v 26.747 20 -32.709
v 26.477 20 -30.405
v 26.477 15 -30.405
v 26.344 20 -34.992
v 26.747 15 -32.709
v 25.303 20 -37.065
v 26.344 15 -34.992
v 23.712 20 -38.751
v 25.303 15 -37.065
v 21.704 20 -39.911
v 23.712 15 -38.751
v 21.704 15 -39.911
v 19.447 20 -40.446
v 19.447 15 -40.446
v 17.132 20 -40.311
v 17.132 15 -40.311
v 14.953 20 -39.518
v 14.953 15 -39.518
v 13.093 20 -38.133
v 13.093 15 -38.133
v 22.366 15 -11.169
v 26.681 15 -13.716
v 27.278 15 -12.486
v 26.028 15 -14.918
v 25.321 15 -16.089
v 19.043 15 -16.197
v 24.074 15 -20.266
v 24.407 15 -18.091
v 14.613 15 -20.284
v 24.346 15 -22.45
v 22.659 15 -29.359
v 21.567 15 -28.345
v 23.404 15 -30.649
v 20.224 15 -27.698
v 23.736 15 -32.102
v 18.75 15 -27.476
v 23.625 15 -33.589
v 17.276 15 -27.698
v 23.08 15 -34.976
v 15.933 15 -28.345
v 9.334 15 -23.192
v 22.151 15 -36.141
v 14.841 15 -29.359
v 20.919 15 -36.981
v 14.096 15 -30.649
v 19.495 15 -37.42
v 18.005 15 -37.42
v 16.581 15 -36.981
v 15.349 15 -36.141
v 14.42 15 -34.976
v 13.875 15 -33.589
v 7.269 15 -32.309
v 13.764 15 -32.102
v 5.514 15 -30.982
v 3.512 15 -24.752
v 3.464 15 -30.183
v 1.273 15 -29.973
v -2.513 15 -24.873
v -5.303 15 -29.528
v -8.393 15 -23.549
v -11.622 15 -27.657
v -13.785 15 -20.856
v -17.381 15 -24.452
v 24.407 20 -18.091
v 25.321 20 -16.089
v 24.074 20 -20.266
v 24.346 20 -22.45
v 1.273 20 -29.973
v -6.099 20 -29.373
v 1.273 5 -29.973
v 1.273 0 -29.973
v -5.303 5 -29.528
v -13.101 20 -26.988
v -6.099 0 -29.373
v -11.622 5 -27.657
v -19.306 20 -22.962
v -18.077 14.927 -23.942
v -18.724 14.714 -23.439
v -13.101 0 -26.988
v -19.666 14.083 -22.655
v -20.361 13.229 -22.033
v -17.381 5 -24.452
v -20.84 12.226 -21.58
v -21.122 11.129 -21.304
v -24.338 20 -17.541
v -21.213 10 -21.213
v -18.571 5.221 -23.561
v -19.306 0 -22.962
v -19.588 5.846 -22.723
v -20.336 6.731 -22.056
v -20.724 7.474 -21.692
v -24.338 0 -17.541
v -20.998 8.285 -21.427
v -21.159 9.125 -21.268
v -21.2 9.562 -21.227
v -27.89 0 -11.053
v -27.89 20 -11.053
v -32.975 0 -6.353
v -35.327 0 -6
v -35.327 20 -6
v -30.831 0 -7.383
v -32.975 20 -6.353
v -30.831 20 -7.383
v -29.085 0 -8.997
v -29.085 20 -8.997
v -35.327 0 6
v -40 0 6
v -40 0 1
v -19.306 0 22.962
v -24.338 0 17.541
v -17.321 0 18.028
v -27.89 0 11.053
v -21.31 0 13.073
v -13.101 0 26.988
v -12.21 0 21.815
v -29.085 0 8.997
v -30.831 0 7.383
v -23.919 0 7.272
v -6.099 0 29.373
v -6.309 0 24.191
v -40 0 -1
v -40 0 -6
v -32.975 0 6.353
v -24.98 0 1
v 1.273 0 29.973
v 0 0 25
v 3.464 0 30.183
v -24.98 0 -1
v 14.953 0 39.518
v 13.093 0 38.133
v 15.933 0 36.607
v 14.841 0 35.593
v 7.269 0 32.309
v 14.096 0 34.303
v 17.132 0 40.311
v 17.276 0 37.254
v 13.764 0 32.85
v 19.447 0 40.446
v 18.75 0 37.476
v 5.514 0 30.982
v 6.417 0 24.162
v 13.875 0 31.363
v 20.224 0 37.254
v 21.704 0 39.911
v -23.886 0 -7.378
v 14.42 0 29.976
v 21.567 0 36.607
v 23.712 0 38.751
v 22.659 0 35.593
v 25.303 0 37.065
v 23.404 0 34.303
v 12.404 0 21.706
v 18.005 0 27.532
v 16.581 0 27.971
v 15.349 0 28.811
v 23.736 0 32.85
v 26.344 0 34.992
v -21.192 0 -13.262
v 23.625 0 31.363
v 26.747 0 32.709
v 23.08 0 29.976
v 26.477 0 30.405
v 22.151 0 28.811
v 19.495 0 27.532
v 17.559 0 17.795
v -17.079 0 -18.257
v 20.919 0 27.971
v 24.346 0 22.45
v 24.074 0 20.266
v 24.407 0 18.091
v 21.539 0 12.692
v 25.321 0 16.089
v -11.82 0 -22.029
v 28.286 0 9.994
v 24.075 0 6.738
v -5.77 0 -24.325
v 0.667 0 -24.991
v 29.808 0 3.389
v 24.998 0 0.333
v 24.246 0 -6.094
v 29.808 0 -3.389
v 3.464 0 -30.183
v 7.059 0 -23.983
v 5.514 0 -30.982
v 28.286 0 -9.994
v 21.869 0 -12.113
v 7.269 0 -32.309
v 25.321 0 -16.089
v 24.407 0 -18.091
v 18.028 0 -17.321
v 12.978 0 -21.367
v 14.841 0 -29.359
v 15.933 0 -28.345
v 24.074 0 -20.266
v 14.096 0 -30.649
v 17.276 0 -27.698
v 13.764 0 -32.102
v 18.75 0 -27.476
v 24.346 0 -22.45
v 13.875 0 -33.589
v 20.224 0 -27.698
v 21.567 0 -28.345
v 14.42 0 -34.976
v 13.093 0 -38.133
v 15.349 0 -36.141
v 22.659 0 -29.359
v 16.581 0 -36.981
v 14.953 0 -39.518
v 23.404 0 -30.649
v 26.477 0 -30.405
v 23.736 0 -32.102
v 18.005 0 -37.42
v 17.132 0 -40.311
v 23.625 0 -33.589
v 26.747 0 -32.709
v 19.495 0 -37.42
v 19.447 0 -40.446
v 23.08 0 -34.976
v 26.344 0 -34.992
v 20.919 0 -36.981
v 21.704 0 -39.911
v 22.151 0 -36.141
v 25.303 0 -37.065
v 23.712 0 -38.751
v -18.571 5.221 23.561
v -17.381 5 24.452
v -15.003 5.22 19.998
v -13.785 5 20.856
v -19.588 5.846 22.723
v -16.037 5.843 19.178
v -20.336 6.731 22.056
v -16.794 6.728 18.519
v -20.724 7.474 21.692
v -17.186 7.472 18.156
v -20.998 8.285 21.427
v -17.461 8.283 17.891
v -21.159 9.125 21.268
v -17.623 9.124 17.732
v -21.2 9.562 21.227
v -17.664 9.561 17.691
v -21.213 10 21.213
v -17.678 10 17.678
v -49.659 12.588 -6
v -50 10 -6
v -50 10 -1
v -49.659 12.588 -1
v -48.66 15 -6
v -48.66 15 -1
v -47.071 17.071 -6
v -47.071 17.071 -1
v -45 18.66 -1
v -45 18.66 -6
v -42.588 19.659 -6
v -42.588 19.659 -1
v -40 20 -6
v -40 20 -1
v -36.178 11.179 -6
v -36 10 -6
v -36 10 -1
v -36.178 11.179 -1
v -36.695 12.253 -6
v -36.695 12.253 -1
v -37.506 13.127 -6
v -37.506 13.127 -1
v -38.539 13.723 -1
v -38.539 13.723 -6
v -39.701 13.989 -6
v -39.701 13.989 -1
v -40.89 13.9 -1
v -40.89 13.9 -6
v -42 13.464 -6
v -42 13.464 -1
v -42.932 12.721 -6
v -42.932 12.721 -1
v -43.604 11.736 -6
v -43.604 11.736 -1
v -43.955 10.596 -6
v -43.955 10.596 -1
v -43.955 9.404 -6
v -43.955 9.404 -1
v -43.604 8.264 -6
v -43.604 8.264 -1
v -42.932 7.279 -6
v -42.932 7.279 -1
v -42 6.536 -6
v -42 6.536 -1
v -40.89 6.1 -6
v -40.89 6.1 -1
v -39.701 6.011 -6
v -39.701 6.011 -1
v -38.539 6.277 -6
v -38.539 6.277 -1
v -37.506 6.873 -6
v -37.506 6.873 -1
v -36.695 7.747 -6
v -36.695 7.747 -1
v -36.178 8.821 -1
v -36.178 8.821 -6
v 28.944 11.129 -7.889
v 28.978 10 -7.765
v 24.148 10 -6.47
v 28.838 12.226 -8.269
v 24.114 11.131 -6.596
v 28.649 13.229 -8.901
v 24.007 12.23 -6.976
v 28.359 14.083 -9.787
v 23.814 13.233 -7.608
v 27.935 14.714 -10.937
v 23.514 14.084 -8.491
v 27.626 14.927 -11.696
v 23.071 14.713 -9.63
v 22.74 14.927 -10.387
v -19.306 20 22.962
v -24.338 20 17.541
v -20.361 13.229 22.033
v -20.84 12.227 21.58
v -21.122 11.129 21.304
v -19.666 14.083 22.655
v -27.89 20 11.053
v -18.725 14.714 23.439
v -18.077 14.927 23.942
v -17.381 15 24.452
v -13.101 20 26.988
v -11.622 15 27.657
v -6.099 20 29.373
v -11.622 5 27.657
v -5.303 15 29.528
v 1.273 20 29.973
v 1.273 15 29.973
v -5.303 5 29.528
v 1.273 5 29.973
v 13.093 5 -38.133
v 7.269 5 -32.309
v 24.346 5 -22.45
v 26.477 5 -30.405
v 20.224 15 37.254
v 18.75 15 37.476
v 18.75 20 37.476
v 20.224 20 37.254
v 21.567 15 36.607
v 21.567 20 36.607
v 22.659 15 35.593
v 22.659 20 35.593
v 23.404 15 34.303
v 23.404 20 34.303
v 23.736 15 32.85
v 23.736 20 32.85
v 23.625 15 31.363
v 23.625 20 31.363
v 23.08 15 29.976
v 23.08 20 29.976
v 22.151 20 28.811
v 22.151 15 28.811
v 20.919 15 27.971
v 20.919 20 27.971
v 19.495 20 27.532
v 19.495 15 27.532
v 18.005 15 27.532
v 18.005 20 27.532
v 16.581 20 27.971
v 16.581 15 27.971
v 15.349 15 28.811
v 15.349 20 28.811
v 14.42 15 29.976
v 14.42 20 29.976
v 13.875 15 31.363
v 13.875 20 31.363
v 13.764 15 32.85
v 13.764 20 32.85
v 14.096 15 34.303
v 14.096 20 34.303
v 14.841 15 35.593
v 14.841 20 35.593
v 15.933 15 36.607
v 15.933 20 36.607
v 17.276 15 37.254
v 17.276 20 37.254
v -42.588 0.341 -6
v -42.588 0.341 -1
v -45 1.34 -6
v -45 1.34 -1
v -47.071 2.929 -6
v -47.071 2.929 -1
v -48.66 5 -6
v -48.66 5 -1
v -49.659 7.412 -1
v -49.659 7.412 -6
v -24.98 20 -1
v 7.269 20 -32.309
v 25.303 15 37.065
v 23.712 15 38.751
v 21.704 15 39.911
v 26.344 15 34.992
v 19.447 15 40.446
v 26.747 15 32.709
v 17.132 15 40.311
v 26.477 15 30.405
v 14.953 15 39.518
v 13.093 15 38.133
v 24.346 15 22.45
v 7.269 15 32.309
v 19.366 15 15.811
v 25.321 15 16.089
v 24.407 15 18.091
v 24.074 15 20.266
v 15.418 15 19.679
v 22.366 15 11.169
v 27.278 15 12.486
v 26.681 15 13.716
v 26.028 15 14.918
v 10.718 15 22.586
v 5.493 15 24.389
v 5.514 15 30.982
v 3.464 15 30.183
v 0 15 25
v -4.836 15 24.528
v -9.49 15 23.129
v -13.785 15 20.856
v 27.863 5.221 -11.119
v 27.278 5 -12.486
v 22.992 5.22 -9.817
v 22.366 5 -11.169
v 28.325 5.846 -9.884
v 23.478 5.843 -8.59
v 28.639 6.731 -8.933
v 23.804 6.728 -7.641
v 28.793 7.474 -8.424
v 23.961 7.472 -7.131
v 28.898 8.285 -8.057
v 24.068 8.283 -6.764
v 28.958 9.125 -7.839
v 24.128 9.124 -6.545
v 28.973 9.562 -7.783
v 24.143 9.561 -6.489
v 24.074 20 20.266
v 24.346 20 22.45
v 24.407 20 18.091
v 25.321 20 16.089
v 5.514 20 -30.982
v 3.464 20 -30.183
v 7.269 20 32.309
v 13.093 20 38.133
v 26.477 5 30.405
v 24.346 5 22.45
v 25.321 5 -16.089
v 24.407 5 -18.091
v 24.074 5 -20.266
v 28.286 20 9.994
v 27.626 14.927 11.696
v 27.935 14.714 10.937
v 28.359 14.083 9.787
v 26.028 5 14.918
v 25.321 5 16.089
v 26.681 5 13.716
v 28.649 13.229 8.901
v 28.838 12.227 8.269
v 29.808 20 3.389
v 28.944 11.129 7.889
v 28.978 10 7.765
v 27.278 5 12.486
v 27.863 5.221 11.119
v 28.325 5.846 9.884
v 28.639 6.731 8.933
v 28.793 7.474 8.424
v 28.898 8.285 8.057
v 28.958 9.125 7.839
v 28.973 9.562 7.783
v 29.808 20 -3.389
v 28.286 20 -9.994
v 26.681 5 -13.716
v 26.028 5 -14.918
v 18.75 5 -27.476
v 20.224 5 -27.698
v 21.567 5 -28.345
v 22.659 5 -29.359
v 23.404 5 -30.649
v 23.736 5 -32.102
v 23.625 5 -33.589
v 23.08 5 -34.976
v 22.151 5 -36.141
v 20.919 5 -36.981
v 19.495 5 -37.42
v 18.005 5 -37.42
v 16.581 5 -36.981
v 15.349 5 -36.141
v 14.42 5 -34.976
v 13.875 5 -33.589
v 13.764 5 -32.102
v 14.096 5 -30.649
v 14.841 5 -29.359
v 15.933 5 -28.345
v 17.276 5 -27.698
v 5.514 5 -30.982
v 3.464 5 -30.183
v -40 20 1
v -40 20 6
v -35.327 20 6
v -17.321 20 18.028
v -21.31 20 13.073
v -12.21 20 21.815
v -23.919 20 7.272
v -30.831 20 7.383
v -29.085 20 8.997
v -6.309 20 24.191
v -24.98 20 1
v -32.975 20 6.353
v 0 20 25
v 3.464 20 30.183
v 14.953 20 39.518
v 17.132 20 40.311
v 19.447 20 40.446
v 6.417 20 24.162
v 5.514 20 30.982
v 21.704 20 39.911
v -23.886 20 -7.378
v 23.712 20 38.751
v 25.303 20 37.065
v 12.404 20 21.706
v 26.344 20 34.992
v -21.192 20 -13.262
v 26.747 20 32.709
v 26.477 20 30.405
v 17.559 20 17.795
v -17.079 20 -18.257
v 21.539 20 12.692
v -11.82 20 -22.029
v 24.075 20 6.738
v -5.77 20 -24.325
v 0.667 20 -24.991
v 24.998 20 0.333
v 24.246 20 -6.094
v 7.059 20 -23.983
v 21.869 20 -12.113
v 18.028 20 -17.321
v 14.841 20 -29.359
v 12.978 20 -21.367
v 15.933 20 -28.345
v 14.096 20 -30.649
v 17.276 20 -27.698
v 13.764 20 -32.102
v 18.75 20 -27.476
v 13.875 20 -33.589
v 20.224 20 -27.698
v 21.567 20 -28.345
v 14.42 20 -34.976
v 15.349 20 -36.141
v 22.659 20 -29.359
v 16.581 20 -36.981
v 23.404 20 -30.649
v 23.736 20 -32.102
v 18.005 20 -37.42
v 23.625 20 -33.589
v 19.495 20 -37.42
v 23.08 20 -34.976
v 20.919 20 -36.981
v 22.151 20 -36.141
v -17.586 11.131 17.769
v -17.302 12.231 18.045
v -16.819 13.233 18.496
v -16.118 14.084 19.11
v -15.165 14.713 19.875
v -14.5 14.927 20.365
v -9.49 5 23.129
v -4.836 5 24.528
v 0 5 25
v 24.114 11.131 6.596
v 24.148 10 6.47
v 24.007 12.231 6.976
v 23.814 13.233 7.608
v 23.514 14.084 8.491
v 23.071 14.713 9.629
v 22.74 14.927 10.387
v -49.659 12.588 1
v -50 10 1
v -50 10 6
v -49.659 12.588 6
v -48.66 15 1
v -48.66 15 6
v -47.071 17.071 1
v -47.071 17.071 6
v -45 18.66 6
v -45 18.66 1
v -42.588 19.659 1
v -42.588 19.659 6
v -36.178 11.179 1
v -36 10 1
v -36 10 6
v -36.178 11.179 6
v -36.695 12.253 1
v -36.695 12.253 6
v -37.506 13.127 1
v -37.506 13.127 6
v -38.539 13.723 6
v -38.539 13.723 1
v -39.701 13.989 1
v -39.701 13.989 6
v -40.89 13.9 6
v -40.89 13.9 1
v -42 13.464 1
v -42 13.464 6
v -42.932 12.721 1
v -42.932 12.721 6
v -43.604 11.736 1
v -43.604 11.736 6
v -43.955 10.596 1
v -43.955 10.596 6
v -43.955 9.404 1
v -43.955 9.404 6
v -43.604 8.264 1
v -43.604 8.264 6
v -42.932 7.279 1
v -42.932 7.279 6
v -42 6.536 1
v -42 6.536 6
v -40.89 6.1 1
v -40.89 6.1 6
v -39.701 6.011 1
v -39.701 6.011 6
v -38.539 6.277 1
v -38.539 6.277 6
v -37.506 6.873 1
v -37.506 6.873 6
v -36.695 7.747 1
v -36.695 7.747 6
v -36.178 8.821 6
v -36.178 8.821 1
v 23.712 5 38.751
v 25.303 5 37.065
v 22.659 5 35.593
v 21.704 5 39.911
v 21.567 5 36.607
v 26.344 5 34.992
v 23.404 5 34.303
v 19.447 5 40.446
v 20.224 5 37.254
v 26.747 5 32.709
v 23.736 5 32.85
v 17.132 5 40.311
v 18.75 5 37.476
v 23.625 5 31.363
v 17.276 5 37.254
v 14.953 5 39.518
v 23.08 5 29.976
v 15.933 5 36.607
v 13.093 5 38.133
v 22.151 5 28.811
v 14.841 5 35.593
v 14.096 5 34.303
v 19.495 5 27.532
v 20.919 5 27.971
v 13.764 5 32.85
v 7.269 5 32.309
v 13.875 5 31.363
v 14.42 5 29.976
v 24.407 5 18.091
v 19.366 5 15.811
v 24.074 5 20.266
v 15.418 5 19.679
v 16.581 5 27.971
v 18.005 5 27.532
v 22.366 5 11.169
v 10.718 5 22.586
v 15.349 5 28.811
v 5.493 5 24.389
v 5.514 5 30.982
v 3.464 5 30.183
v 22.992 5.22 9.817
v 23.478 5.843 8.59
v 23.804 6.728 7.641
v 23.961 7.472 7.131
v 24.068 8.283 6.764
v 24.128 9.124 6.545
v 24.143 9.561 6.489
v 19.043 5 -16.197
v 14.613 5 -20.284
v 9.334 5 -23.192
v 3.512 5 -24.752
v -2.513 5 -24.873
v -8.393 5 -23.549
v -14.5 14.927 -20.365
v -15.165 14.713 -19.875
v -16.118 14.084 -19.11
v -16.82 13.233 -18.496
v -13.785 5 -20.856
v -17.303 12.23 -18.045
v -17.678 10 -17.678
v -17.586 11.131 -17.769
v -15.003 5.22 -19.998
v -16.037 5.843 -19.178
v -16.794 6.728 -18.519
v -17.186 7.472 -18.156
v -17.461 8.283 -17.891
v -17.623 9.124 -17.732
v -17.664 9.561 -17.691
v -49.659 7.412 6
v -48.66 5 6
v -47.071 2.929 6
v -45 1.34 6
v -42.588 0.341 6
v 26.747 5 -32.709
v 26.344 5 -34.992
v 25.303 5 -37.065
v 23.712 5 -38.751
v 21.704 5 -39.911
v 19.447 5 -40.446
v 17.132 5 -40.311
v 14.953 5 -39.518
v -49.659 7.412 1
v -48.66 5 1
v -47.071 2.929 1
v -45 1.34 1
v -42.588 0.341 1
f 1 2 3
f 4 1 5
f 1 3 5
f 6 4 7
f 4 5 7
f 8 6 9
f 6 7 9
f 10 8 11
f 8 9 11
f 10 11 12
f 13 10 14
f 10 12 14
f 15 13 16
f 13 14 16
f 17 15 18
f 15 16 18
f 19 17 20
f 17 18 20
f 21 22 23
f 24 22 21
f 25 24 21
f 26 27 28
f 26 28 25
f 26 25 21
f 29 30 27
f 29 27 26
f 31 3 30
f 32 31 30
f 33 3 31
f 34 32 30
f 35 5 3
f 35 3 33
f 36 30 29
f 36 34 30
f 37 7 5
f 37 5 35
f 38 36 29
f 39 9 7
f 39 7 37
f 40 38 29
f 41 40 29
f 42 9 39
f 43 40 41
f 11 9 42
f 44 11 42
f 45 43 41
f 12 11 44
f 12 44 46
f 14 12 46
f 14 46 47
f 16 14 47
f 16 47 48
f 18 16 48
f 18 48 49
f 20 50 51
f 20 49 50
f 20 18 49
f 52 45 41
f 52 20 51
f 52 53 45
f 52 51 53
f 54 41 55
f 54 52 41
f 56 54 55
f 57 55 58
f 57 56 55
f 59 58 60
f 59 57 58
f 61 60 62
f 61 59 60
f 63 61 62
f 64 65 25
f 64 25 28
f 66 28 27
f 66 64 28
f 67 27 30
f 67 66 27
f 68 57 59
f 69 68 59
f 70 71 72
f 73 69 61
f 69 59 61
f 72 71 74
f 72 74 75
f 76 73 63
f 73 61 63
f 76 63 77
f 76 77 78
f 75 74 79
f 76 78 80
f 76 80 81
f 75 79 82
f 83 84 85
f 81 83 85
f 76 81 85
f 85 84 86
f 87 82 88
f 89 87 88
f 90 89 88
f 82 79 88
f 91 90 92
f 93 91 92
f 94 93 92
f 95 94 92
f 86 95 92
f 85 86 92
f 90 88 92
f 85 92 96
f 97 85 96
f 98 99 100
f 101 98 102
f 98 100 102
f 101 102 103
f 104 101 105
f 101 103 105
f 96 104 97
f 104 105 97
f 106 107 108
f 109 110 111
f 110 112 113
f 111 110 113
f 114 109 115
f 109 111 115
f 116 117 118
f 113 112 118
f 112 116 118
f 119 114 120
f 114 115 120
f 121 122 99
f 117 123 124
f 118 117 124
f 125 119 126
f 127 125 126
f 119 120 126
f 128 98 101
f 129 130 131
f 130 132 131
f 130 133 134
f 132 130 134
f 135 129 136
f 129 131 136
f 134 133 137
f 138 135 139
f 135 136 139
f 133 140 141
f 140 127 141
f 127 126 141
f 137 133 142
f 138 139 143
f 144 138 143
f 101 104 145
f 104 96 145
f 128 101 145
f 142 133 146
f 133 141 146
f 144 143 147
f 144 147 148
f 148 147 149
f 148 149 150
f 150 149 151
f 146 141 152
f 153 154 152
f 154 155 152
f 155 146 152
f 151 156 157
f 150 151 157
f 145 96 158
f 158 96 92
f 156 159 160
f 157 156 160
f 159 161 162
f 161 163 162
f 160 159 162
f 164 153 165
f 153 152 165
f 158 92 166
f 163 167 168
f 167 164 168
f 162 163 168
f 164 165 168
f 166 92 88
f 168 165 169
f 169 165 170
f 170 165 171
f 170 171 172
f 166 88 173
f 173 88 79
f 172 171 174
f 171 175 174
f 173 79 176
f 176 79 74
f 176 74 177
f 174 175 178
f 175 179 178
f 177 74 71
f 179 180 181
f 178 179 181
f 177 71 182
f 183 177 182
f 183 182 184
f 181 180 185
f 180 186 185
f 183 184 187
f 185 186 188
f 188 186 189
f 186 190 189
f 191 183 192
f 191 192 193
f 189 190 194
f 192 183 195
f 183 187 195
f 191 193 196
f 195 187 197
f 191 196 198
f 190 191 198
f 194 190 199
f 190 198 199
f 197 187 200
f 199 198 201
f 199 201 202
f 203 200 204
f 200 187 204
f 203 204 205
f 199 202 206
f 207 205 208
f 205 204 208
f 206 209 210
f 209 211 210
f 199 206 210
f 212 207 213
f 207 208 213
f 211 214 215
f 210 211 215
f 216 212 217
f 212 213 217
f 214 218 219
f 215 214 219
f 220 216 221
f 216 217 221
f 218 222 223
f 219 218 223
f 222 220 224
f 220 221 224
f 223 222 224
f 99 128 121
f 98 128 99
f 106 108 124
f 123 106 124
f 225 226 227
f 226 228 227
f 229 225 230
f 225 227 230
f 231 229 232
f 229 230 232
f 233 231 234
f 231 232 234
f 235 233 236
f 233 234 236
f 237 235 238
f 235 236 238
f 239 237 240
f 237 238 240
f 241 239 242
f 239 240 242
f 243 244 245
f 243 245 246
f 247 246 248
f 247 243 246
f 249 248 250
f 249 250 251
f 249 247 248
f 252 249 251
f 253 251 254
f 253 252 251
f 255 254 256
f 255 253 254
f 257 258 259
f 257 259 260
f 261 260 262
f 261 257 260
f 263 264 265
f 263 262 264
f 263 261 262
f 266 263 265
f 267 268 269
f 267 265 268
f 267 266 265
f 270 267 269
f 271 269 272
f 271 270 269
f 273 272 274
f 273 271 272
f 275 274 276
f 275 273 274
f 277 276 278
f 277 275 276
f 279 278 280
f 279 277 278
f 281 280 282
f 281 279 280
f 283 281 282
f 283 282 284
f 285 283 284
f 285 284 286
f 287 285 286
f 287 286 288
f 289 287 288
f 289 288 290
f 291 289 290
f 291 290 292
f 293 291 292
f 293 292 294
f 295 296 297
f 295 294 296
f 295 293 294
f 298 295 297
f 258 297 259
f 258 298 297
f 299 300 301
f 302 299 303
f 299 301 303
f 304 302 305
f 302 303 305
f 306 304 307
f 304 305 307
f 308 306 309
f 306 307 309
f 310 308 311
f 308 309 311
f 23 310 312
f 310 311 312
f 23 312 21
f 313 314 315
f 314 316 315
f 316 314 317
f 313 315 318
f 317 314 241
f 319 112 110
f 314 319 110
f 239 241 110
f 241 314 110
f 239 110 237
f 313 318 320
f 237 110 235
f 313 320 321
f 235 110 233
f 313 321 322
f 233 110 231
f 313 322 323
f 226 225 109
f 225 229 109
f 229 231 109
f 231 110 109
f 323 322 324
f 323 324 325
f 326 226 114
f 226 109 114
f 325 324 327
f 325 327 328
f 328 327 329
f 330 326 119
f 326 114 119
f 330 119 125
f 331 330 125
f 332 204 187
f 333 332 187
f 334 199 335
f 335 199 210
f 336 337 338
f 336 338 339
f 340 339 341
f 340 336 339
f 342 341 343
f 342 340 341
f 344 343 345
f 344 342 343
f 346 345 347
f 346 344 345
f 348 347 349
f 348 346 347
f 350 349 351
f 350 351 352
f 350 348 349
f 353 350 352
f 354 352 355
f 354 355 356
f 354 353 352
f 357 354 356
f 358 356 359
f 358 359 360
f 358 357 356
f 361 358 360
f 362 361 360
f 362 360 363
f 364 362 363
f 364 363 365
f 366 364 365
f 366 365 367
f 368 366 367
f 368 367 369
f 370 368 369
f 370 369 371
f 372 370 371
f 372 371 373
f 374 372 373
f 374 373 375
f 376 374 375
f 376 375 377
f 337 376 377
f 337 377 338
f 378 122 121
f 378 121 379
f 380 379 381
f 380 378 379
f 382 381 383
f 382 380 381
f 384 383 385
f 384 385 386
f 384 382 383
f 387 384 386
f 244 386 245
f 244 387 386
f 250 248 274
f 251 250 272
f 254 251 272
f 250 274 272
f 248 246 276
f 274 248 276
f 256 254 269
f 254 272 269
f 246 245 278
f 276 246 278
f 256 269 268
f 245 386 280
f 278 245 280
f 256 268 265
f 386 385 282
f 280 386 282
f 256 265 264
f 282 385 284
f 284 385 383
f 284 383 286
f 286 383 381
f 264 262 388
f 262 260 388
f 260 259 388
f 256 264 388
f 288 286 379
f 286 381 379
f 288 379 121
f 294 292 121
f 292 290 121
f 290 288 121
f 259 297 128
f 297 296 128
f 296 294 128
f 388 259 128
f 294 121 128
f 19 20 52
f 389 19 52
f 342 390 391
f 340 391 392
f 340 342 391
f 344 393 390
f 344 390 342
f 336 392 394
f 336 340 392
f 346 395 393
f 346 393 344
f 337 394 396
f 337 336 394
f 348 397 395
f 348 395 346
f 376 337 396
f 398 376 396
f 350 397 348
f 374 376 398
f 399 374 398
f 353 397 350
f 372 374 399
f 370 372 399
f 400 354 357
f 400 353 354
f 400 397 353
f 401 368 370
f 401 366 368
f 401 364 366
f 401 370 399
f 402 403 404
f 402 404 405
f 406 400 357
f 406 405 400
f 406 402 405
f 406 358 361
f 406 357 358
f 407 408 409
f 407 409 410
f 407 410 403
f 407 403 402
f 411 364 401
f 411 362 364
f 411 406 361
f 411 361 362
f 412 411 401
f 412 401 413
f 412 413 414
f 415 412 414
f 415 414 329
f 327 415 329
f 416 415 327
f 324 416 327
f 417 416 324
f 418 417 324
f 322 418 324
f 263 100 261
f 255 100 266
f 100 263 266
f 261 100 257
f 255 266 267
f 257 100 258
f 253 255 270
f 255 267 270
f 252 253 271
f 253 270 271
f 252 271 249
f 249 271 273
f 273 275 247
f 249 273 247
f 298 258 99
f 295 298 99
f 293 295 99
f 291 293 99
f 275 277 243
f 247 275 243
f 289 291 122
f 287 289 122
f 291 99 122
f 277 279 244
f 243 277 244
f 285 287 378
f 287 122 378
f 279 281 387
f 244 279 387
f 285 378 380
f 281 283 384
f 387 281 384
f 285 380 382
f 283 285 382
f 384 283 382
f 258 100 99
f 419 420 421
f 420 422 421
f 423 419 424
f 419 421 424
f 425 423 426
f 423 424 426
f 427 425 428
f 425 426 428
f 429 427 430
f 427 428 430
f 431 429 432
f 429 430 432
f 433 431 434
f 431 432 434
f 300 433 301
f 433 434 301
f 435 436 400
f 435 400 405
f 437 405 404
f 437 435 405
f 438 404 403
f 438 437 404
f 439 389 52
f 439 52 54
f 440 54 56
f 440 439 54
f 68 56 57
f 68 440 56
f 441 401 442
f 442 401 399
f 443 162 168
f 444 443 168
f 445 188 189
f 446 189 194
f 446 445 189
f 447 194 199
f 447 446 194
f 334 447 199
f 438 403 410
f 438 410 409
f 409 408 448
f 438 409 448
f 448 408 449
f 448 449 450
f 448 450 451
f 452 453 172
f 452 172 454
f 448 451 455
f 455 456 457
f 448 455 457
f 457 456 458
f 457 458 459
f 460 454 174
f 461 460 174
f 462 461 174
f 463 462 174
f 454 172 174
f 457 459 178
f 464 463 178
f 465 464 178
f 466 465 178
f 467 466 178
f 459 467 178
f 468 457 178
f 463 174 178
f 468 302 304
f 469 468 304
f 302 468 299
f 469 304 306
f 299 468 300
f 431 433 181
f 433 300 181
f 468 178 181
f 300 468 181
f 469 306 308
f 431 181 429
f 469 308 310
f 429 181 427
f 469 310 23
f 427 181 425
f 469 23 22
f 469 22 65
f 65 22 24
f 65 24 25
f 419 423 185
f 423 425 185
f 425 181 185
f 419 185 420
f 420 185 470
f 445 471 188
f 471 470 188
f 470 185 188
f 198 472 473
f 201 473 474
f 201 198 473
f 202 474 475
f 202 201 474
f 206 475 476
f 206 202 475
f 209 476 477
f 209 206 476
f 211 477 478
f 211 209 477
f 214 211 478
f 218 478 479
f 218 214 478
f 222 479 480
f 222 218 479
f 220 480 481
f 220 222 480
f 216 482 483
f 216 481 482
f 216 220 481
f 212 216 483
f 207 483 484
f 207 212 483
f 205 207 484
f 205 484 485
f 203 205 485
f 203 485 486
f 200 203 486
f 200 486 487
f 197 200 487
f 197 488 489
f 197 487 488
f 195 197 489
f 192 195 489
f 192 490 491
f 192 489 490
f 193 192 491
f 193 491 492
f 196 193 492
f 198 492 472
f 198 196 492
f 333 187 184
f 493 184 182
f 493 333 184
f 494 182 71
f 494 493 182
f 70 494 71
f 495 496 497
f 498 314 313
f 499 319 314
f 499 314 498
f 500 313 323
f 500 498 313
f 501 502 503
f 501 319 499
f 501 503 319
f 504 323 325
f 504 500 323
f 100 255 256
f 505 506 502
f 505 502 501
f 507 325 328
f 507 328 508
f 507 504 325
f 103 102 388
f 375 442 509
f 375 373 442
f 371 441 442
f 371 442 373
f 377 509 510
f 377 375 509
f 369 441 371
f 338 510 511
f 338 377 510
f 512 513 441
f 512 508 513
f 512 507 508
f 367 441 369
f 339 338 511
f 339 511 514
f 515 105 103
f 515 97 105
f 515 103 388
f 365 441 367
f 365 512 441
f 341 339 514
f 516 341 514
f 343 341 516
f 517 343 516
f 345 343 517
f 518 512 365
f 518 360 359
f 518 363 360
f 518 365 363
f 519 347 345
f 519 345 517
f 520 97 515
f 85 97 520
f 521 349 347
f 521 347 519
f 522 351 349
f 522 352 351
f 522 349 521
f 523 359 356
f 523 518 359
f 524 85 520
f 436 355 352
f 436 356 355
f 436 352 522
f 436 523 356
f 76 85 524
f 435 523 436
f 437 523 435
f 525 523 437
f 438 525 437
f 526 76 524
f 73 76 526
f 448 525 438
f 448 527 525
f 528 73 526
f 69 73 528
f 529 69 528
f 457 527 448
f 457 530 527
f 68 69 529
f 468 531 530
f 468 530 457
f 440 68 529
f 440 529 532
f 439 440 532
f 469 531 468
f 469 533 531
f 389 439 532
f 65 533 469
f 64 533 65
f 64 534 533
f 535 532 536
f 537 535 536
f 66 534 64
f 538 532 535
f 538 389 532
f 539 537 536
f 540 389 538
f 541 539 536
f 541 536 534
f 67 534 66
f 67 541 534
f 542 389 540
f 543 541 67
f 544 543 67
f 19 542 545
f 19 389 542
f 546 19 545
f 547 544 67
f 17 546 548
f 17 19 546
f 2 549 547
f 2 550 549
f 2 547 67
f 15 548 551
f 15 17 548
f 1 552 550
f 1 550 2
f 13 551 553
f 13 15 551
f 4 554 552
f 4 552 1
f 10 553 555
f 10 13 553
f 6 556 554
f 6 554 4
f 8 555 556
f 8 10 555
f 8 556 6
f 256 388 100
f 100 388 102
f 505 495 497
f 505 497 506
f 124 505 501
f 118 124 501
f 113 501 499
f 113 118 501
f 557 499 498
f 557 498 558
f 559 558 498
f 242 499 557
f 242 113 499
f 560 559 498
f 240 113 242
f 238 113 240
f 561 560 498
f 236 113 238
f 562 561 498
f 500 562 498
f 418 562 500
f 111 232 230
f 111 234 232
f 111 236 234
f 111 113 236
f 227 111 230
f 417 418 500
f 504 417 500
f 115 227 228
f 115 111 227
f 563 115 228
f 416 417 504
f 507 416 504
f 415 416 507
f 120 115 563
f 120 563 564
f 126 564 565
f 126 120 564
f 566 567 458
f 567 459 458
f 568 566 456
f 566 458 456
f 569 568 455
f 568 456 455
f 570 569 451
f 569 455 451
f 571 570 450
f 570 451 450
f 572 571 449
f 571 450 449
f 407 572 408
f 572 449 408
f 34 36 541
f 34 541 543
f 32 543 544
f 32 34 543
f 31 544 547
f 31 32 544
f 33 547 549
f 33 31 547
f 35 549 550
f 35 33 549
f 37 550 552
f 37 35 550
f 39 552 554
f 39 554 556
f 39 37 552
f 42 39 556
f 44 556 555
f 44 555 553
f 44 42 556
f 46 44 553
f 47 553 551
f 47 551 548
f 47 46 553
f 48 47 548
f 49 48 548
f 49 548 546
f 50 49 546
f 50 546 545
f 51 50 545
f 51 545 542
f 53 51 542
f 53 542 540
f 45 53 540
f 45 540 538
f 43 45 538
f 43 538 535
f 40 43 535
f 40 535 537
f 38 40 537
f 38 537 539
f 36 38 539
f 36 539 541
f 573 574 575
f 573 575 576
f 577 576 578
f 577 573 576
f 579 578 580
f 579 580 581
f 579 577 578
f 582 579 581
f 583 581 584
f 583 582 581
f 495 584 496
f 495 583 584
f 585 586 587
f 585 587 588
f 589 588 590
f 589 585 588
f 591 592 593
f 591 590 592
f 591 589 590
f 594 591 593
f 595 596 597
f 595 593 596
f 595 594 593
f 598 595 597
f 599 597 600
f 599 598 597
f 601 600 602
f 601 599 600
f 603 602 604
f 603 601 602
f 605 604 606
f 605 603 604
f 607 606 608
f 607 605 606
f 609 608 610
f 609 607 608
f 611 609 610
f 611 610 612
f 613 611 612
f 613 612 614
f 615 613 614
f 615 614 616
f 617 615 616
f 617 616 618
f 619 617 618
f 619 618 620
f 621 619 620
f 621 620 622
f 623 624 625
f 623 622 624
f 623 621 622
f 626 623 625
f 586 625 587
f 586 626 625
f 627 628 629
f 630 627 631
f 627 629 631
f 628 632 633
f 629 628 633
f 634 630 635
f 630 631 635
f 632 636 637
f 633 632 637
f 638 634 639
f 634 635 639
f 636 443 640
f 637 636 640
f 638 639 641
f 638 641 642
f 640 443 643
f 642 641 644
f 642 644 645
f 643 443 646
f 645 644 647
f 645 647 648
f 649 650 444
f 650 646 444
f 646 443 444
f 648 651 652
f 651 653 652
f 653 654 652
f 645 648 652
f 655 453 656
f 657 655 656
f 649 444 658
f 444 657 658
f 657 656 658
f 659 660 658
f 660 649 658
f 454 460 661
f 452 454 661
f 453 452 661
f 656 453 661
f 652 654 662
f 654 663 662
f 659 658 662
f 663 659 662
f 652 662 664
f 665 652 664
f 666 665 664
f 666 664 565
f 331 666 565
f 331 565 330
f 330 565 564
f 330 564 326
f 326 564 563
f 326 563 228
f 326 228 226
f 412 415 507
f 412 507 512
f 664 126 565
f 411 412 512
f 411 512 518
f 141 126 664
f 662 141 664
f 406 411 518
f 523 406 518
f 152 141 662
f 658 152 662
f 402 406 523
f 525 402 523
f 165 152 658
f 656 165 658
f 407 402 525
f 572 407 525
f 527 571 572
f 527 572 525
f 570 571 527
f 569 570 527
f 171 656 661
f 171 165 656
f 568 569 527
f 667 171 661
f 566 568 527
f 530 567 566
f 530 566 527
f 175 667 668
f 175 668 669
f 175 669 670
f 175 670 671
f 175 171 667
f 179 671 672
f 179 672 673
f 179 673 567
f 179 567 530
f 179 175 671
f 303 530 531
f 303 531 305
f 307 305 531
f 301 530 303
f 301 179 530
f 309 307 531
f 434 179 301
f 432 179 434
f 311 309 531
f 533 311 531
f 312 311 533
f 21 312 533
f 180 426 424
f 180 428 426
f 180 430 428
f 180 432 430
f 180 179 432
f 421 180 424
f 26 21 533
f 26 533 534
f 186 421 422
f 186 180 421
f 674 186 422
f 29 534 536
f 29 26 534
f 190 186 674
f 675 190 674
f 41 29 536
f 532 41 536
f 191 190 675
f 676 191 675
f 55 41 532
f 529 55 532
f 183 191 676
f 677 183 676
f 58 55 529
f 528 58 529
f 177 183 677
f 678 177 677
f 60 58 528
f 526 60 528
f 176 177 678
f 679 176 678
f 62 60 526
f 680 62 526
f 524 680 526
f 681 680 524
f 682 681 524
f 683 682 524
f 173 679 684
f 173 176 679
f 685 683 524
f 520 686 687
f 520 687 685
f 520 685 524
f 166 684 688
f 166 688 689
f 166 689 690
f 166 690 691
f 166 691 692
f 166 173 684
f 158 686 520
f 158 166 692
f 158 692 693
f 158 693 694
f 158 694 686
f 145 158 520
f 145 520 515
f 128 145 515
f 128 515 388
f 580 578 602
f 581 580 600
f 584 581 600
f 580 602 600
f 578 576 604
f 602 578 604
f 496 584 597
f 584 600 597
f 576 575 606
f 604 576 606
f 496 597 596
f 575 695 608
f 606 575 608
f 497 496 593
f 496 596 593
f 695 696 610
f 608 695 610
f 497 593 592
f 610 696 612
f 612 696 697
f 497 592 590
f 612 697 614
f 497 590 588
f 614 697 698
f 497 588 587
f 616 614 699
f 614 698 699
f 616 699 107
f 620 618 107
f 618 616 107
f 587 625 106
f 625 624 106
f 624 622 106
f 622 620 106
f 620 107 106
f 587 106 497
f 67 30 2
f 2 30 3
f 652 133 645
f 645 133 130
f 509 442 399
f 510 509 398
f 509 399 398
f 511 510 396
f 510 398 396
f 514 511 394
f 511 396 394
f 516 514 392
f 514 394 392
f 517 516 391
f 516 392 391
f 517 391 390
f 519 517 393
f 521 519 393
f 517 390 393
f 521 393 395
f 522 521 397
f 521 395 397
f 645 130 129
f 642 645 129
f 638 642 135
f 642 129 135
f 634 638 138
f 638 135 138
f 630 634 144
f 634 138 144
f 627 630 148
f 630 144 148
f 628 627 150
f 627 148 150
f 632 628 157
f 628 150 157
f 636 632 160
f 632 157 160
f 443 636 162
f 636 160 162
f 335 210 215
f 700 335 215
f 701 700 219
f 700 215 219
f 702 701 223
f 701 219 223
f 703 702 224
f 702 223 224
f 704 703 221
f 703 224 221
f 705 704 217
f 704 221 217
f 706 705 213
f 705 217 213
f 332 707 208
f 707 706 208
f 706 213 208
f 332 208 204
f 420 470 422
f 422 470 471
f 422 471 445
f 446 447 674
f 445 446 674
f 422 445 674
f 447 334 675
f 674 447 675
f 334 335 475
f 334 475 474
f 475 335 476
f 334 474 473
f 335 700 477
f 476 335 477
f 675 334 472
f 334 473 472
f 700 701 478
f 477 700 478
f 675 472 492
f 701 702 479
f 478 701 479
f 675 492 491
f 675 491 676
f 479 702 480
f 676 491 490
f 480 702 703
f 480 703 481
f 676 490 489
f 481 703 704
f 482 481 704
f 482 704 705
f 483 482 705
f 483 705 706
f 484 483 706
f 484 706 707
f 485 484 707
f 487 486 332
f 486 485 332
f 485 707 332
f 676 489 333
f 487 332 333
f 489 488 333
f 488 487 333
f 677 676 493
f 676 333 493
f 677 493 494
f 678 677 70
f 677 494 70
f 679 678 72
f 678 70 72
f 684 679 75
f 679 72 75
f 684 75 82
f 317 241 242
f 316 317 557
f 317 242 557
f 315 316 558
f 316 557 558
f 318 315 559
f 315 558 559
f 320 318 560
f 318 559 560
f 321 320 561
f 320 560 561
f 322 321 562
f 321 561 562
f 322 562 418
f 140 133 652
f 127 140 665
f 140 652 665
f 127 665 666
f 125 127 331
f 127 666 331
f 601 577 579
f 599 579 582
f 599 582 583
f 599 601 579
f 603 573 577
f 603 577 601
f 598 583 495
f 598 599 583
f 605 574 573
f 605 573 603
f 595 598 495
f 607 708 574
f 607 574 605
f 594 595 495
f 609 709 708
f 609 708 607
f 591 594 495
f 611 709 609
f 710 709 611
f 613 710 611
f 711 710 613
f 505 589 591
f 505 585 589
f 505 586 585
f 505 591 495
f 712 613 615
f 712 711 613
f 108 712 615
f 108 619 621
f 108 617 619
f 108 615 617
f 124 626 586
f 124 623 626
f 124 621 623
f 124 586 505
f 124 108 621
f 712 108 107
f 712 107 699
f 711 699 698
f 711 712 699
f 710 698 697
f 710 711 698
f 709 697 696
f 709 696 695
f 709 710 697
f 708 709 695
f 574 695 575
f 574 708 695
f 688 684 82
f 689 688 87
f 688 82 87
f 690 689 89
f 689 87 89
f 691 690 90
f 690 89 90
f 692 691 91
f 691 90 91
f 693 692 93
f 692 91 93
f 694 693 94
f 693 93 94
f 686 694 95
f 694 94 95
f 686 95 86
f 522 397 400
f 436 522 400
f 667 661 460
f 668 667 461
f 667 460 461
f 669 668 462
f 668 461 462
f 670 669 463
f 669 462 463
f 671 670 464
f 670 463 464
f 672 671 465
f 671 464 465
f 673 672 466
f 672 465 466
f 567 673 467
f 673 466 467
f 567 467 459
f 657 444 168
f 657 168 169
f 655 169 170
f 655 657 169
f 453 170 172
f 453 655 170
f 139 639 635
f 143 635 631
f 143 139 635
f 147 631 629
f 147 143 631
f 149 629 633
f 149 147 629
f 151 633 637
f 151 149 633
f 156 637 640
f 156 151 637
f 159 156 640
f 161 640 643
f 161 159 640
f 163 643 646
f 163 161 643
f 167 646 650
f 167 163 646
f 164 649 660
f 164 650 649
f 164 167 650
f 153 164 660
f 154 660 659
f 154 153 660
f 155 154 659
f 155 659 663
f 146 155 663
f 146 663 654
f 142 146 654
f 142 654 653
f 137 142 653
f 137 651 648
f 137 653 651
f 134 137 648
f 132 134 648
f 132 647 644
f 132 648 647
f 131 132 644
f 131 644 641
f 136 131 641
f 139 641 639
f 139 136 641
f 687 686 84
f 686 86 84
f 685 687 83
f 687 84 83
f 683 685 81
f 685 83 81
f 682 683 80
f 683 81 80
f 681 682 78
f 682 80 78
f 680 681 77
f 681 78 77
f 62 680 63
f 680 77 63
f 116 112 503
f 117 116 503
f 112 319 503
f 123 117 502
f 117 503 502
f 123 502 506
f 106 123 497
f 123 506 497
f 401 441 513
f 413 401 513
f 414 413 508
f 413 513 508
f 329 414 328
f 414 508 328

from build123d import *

# Parameters (mm, degrees)
SKETCH1_R               = 5
SKETCH1_R_2             = 25
BOSS_EXTRUDE1_DEPTH     = 20
FILLET1_R               = 8
CUT_EXTRUDE4_START      = 5
CUT_EXTRUDE4_DEPTH      = 10
FILLET4_R               = 5
FILLET5_R               = 5
FILLET6_R               = 5
FILLET7_R               = 5
CUT_EXTRUDE5_DEPTH      = 68.366926205
CUT_EXTRUDE5_DEPTH_BACK = 68.366926205
SKETCH9_R               = 4
CUT_EXTRUDE6_DEPTH      = 68.366926205
CUT_EXTRUDE6_DEPTH_BACK = 68.366926205
SKETCH10_W              = 39.746236579
SKETCH10_H              = 2


with BuildPart() as part:
    # Sketch1 → Boss-Extrude1 (new body)
    with BuildSketch(Plane(origin=(0, 0, 0), x_dir=(1, 0, 0), z_dir=(0, 1, 0))):
        with BuildLine():
            ThreePointArc((13.093145751, -38.132806891), (22.75, -39.404155872), (26.47740661, -30.405400281))
            Line((26.47740661, -30.405400281), (23.370465731, -18.810139062))
            ThreePointArc((23.370465731, -18.810139062), (30, 0), (23.370465731, 18.810139062))
            Line((23.370465731, 18.810139062), (26.47740661, 30.405400281))
            ThreePointArc((26.47740661, 30.405400281), (22.75, 39.404155872), (13.093145751, 38.132806891))
            Line((13.093145751, 38.132806891), (4.604825411, 29.644486552))
            ThreePointArc((4.604825411, 29.644486552), (-17.128622381, 24.629459907), (-29.393876913, 6))
            Line((-29.393876913, 6), (-50, 6))
            Line((-50, 6), (-50, -6))
            Line((-50, -6), (-29.393876913, -6))
            ThreePointArc((-29.393876913, -6), (-17.128622381, -24.629459907), (4.604825411, -29.644486552))
            Line((4.604825411, -29.644486552), (13.093145751, -38.132806891))
        make_face()
        with Locations(Location((18.75, -32.475952642, 0), (0, 0, 270))):
            Circle(SKETCH1_R, mode=Mode.SUBTRACT)
        with Locations(Location((0, 0, 0), (0, 0, 270))):
            Circle(SKETCH1_R_2, mode=Mode.SUBTRACT)
        with Locations(Location((18.75, 32.475952642, 0), (0, 0, 270))):
            Circle(SKETCH1_R, mode=Mode.SUBTRACT)
    extrude(amount=BOSS_EXTRUDE1_DEPTH)

    # Fillet1
    fillet1_edges = [part.edges().sort_by_distance(p)[0] for p in [
        (23.370465731, 10, -18.810139062),
        (23.370465731, 10, 18.810139062),
        (4.604825411, 10, 29.644486552),
        (-29.393876913, 10, 6),
        (-29.393876913, 10, -6),
        (4.604825411, 10, -29.644486552),
    ]]
    fillet(fillet1_edges, radius=FILLET1_R)

    # Sketch8 → Cut-Extrude4 (cut)
    with BuildSketch(Plane(origin=(0, 0, 0), x_dir=(1, 0, 0), z_dir=(0, 1, 0)).offset(CUT_EXTRUDE4_START)):
        Polygon((0, 0), (112.790369841, -30.222088513), (-54.928380423, -54.928380423), align=None)
        Polygon((0, 0), (-54.928380423, 54.928380423), (112.790369841, 30.222088513), align=None)
    extrude(amount=CUT_EXTRUDE4_DEPTH, mode=Mode.SUBTRACT)

    # Fillet4
    fillet4_edges = [part.edges().sort_by_distance(p)[0] for p in [
        (-19.445436483, 5, 19.445436483),
        (-19.445436483, 15, 19.445436483),
    ]]
    fillet(fillet4_edges, radius=FILLET4_R - 0.0001)  # a hair under: the kernel refuses the full size

    # Fillet5
    fillet5_edges = [part.edges().sort_by_distance(p)[0] for p in [
        (26.562960223, 15, 7.11752374),
        (26.562960223, 5, 7.11752374),
    ]]
    fillet(fillet5_edges, radius=FILLET5_R - 0.0001)  # a hair under: the kernel refuses the full size

    # Fillet6
    fillet6_edges = [part.edges().sort_by_distance(p)[0] for p in [
        (26.562960223, 5, -7.11752374),
        (26.562960223, 15, -7.11752374),
    ]]
    fillet(fillet6_edges, radius=FILLET6_R - 0.0001)  # a hair under: the kernel refuses the full size

    # Fillet7
    fillet7_edges = [part.edges().sort_by_distance(p)[0] for p in [
        (-19.445436483, 15, -19.445436483),
        (-19.445436483, 5, -19.445436483),
    ]]
    fillet(fillet7_edges, radius=FILLET7_R - 0.0001)  # a hair under: the kernel refuses the full size

    # Sketch9 → Cut-Extrude5 (cut, two sides: drawn at the far end of the back side and taken through both)
    with BuildSketch(Plane.XY.offset(-CUT_EXTRUDE5_DEPTH_BACK)):
        with BuildLine():
            ThreePointArc((-50, 10), (-47.071067812, 17.071067812), (-40, 20))
            Line((-40, 20), (-50, 20))
            Line((-50, 20), (-50, 10))
        make_face()
        with BuildLine():
            ThreePointArc((-40, 0), (-47.071067812, 2.928932188), (-50, 10))
            Line((-50, 10), (-50, 0))
            Line((-50, 0), (-40, 0))
        make_face()
        with Locations((-40, 10)):
            Circle(SKETCH9_R)
    extrude(amount=CUT_EXTRUDE5_DEPTH + CUT_EXTRUDE5_DEPTH_BACK, mode=Mode.SUBTRACT)

    # Sketch10 → Cut-Extrude6 (cut, two sides: drawn at the far end of the back side and taken through both)
    with BuildSketch(Plane(origin=(0, 20, 0), x_dir=(1, 0, 0), z_dir=(0, 1, 0)).offset(-CUT_EXTRUDE6_DEPTH_BACK)):
        with Locations((-38.779837972, 0)):
            Rectangle(SKETCH10_W, SKETCH10_H)
    extrude(amount=CUT_EXTRUDE6_DEPTH + CUT_EXTRUDE6_DEPTH_BACK, mode=Mode.SUBTRACT)


solid = part.part
